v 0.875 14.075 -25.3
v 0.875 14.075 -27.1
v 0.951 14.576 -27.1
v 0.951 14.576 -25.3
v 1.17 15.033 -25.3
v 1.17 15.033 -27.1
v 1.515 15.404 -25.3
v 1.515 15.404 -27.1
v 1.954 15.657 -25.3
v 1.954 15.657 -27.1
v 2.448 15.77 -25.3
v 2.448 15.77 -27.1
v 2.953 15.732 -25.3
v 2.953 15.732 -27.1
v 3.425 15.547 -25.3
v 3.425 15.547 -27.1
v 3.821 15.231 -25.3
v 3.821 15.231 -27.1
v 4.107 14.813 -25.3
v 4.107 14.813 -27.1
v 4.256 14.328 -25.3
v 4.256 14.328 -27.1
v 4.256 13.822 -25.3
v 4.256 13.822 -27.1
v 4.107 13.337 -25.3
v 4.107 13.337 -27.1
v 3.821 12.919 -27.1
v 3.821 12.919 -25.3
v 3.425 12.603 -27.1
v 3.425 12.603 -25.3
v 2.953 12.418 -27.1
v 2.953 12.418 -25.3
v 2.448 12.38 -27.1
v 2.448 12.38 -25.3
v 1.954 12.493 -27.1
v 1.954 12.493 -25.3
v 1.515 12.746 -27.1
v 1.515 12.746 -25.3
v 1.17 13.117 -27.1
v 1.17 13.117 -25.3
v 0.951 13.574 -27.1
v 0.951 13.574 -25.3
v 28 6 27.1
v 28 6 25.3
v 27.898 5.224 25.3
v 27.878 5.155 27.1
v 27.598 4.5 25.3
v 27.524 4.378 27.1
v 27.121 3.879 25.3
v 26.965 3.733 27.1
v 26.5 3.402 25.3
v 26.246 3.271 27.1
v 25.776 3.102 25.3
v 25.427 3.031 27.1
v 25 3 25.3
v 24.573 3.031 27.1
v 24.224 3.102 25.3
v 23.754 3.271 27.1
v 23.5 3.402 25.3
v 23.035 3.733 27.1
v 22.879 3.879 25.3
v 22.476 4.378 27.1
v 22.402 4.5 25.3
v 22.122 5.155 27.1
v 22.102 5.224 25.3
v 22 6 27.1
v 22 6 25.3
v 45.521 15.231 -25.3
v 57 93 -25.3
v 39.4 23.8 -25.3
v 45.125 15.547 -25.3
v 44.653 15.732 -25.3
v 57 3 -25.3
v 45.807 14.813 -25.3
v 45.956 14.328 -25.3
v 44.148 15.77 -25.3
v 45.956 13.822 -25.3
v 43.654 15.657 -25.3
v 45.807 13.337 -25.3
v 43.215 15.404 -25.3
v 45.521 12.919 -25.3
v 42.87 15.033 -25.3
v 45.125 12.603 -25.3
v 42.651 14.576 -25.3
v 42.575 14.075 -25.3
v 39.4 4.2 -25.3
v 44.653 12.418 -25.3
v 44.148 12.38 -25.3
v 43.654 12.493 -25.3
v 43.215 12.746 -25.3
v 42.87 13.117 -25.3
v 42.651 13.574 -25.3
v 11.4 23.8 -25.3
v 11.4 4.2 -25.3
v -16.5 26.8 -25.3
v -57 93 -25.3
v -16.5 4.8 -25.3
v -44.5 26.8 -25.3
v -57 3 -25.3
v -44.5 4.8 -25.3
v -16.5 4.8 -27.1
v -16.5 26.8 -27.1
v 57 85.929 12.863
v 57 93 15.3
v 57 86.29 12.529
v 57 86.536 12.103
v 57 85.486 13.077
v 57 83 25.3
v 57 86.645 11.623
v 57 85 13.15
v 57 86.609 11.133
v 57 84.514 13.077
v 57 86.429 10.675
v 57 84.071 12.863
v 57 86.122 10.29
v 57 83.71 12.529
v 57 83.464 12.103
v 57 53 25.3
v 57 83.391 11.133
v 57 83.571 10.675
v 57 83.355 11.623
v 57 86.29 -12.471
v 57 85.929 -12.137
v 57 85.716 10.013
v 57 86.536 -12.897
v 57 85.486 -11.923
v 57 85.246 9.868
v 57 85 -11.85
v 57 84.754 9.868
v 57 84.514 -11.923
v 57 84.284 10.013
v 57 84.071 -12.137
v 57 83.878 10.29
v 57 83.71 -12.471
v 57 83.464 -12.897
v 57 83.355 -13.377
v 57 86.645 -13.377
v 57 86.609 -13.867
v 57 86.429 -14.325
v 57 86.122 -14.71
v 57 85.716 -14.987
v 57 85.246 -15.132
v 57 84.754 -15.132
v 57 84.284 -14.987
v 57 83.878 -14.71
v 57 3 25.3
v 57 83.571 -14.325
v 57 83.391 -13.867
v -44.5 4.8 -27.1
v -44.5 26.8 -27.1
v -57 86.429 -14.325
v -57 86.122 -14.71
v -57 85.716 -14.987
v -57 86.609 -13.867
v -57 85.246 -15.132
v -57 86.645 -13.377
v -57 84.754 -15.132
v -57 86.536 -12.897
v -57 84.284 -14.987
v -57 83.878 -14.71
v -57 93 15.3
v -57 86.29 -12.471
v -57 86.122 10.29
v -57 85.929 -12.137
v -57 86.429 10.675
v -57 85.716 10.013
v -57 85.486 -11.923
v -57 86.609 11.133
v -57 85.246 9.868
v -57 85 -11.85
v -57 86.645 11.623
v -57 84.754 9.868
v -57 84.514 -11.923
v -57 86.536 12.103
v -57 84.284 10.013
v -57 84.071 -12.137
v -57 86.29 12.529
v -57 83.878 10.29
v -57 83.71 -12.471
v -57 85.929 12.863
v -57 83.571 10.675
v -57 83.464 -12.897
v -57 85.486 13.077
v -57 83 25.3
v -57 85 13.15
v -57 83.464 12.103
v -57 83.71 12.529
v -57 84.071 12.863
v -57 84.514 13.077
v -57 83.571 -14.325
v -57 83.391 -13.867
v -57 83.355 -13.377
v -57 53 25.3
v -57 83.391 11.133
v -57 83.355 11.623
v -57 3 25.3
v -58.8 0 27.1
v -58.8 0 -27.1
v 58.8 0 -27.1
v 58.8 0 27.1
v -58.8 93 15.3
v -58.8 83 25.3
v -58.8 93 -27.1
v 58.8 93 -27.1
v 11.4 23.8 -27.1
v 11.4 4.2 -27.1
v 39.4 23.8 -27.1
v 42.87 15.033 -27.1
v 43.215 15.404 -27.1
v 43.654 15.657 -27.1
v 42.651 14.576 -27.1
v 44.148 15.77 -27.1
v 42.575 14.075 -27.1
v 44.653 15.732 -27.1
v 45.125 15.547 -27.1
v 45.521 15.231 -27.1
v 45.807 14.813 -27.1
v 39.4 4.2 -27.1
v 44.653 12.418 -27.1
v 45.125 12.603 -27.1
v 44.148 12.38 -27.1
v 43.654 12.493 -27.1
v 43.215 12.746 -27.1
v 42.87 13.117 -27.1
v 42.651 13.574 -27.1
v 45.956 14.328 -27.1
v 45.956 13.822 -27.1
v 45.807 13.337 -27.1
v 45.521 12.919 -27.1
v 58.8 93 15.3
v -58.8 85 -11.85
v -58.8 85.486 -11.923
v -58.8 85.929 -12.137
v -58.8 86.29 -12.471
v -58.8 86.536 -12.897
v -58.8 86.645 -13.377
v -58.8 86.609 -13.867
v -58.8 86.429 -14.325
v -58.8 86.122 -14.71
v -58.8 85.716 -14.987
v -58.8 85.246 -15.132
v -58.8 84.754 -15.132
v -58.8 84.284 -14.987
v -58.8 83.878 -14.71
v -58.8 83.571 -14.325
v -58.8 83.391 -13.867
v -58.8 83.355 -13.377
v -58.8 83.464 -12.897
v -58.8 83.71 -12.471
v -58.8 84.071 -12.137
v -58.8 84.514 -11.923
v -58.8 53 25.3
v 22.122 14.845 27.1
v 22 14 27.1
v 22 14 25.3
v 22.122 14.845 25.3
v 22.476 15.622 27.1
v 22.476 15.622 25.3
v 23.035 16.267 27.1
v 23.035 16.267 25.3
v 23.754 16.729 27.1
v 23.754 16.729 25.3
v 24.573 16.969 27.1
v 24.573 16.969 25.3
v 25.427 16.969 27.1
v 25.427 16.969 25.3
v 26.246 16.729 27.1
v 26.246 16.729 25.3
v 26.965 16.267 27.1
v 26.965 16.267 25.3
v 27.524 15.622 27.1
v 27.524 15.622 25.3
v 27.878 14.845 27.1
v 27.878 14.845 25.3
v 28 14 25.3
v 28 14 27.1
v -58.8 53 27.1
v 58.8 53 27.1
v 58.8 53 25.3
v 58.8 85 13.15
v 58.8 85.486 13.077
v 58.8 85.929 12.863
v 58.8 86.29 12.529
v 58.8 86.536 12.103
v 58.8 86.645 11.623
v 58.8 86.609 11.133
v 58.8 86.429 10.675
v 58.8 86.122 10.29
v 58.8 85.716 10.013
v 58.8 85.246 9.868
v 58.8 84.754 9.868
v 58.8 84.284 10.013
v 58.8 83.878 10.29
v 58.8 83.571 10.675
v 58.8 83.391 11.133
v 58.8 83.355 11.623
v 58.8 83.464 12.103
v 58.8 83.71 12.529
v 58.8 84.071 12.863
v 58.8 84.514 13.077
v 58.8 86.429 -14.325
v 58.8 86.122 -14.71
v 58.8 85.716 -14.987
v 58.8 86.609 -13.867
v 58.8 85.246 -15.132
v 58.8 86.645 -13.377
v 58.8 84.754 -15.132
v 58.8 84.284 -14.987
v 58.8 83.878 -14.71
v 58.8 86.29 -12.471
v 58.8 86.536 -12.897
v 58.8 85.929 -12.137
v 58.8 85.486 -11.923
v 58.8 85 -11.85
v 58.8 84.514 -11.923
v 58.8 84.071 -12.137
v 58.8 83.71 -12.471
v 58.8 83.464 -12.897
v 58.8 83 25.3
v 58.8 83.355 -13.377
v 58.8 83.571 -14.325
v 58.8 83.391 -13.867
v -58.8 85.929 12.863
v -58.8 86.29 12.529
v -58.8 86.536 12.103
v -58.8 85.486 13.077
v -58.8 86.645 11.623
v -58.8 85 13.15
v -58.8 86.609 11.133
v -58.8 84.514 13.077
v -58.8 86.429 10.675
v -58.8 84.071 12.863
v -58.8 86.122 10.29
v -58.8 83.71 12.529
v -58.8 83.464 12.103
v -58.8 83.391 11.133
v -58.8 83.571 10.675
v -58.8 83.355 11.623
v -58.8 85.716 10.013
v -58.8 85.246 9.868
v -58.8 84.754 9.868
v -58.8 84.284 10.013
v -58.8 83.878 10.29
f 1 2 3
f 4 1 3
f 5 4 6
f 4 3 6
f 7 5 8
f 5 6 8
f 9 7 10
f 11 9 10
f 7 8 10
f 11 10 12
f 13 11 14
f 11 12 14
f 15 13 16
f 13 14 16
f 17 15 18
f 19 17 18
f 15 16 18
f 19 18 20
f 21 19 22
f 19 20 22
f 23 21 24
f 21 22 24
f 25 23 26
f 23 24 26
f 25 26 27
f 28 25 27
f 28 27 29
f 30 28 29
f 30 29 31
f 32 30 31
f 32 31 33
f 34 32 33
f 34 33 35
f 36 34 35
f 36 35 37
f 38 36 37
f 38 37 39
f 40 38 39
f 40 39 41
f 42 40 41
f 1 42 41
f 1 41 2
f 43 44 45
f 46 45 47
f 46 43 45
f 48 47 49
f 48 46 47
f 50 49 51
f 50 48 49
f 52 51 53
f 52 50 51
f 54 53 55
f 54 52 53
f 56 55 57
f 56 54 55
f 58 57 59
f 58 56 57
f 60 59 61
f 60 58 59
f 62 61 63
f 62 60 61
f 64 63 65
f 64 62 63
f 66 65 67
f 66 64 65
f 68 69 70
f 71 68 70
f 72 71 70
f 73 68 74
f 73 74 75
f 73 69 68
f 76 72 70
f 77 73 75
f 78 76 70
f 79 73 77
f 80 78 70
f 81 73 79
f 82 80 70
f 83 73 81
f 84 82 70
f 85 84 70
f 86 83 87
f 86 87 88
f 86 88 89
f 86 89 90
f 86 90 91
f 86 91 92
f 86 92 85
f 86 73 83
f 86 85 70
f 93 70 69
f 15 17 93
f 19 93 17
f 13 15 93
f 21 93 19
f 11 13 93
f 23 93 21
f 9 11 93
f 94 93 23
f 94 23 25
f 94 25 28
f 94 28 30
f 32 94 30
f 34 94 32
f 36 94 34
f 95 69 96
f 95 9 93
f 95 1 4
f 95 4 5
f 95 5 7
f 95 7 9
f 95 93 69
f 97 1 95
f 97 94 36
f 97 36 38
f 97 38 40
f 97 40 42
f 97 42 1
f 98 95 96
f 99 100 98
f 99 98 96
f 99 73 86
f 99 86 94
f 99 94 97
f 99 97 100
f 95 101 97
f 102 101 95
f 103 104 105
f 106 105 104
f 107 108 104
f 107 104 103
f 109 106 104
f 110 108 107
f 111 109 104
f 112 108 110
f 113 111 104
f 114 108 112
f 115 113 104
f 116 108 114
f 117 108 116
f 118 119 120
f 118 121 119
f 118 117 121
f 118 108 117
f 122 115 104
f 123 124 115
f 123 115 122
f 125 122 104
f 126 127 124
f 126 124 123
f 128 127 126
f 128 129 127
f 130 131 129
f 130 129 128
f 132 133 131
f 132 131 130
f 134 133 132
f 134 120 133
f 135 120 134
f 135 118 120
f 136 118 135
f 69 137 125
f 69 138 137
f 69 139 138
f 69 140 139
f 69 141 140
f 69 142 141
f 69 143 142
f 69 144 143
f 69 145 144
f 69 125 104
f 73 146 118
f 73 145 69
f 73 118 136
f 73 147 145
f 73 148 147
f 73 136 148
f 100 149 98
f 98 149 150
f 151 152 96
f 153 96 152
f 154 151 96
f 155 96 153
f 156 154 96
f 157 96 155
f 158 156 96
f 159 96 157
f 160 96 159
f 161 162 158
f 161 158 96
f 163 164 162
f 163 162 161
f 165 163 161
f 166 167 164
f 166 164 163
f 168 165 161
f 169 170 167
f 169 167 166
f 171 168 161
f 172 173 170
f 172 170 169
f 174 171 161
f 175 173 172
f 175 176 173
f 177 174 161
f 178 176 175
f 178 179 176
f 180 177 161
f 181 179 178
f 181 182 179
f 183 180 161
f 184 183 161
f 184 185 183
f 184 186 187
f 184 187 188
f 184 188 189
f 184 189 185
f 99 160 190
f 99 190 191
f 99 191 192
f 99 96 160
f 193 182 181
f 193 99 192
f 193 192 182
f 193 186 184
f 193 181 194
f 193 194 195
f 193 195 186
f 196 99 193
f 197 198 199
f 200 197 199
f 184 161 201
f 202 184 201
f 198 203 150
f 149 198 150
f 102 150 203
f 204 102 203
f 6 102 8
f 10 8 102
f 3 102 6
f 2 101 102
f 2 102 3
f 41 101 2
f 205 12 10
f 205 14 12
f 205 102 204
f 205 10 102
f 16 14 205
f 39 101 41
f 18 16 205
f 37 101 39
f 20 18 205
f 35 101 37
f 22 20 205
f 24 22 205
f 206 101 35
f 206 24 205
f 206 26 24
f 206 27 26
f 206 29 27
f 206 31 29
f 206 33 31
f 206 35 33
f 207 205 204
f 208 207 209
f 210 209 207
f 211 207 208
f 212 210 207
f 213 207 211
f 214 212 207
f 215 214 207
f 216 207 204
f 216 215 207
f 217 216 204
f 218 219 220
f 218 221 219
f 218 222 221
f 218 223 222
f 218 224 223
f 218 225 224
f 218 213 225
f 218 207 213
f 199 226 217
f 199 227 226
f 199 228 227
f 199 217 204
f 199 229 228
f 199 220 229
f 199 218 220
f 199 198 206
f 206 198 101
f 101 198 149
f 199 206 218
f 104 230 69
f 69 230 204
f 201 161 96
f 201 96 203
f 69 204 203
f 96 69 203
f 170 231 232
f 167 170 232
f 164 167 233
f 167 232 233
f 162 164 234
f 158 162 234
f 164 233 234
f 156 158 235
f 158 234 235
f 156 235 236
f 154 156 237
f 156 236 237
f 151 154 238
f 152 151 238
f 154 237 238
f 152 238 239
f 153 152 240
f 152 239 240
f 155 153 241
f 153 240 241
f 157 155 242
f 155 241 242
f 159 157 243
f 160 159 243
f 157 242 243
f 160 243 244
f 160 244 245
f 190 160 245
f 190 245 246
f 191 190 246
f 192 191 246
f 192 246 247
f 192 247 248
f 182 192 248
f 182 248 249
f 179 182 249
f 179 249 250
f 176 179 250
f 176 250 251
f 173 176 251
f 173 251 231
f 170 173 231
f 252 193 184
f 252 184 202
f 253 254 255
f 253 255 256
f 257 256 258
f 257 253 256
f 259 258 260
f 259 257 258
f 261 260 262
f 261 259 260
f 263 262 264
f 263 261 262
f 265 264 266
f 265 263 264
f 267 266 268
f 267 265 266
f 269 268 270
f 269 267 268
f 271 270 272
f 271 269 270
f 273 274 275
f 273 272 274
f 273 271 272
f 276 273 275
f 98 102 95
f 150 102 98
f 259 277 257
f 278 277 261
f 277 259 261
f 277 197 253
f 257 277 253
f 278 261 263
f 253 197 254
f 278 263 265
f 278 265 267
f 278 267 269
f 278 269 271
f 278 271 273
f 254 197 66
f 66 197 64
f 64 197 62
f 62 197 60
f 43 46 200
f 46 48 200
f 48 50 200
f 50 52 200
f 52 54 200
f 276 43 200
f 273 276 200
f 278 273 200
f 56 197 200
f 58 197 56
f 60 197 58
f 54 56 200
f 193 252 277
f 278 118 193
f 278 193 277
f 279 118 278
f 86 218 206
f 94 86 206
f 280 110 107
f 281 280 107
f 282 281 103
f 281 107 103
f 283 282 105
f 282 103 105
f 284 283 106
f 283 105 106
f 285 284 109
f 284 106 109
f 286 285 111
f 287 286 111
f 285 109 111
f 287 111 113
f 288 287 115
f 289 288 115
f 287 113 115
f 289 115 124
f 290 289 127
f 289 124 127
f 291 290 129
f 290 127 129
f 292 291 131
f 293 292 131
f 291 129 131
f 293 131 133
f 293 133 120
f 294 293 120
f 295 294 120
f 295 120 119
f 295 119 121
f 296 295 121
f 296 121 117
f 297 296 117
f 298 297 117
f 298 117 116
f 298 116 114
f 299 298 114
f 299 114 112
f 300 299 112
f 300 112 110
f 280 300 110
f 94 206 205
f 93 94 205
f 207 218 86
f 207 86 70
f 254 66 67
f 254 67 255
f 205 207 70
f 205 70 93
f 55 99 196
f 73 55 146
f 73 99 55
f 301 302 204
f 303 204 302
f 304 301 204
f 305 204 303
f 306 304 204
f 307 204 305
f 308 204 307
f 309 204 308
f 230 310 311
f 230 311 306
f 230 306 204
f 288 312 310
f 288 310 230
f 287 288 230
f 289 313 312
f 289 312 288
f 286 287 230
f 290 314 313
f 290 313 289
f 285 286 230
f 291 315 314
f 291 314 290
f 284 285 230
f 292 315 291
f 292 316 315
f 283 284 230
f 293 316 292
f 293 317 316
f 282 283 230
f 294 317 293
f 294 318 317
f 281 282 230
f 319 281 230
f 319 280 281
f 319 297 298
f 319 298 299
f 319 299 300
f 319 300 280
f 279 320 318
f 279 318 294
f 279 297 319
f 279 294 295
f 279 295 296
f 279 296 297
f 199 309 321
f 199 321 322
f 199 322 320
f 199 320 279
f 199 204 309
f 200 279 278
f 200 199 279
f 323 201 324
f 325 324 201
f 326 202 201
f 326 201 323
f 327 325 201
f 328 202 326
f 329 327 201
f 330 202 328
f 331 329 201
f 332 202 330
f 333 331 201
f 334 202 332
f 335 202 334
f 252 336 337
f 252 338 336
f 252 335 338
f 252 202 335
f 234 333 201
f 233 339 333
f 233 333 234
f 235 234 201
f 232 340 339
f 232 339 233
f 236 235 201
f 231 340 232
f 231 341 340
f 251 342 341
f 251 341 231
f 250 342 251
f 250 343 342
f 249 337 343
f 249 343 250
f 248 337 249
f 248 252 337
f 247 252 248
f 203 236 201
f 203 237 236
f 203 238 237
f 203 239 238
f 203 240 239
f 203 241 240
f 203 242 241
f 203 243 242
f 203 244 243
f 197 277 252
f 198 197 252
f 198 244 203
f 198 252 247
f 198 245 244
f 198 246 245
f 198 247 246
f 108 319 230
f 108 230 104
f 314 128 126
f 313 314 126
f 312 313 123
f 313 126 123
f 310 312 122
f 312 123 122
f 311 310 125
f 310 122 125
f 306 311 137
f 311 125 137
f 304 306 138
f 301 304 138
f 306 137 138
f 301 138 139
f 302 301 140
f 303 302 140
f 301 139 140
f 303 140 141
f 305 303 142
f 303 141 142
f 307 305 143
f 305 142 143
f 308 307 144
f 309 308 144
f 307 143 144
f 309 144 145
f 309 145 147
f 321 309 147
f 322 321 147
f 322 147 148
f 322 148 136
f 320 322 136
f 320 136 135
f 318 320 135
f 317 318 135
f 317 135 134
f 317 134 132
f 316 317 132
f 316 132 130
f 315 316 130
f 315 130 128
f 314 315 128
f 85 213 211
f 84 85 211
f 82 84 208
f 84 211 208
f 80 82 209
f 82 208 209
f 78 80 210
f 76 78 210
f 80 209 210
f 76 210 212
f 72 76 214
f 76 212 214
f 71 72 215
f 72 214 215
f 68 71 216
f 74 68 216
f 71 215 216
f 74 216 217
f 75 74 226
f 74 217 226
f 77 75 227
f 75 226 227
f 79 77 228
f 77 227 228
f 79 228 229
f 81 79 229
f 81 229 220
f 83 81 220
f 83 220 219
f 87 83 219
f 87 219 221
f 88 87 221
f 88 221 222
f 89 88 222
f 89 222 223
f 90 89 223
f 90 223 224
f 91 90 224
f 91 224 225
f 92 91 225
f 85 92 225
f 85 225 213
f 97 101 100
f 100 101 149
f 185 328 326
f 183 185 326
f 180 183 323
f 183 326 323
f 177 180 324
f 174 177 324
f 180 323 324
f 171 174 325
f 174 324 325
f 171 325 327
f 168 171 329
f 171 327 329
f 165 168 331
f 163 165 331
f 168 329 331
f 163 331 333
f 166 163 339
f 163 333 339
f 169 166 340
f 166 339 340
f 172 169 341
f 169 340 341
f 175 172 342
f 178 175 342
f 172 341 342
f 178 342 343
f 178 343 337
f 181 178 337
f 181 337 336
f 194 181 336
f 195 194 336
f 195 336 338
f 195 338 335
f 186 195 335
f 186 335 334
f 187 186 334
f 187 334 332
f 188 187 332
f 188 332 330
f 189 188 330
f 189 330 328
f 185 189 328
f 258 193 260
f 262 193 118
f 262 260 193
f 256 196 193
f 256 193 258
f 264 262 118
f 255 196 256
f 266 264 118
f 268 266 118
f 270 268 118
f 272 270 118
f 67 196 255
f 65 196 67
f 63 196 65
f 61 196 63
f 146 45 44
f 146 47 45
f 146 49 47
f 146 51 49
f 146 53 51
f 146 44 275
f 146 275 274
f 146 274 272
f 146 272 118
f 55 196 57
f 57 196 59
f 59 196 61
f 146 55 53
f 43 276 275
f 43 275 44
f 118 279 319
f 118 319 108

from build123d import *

# Parameters (mm, degrees)
SKETCH2_W           = 117.6
SKETCH2_H           = 54.2
BOSS_EXTRUDE1_DEPTH = 3
SKETCH3_W           = 117.6
SKETCH3_H           = 54.2
SKETCH3_W_2         = 114
SKETCH3_H_2         = 50.6
BOSS_EXTRUDE2_DEPTH = 50
BOSS_EXTRUDE3_DEPTH = 40
CHAMFER1_SIZE       = 10
SKETCH5_R           = 1.65
CUT_EXTRUDE1_DEPTH  = 153.358688627
CUT_EXTRUDE2_REACH  = 124.654
SKETCH6_R           = 1.7
SKETCH6_W           = 28
SKETCH6_H           = 19.6
SKETCH6_H_2         = 22
CUT_EXTRUDE3_REACH  = 124.654


with BuildPart() as part:
    # Sketch2 → Boss-Extrude1 (new body)
    with BuildSketch(Plane(origin=(0, 0, 0), x_dir=(1, 0, 0), z_dir=(0, 1, 0))):
        Rectangle(SKETCH2_W, SKETCH2_H)
    extrude(amount=BOSS_EXTRUDE1_DEPTH)

    # Sketch3 → Boss-Extrude2 (add)
    with BuildSketch(Plane(origin=(0, 3, 0), x_dir=(1, 0, 0), z_dir=(0, 1, 0))):
        Rectangle(SKETCH3_W, SKETCH3_H)
        Rectangle(SKETCH3_W_2, SKETCH3_H_2, mode=Mode.SUBTRACT)
    extrude(amount=BOSS_EXTRUDE2_DEPTH)

    # Sketch4 → Boss-Extrude3 (add)
    with BuildSketch(Plane(origin=(0, 53, 0), x_dir=(1, 0, 0), z_dir=(0, 1, 0))):
        Polygon((57, -25.3), (57, 25.3), (-57, 25.3), (-57, -25.3), (-58.8, -25.3), (-58.8, 27.1), (58.8, 27.1), (58.8, -25.3), align=None)
    extrude(amount=BOSS_EXTRUDE3_DEPTH)

    # Chamfer1
    chamfer1_edges = [part.edges().sort_by_distance(p)[0] for p in [
        (-57.9, 93, 25.3),
        (57.9, 93, 25.3),
    ]]
    chamfer(chamfer1_edges, length=CHAMFER1_SIZE)

    # Sketch5 → Cut-Extrude1 (cut, through all)
    with BuildSketch(Plane.ZY.offset(58.8)):
        with Locations((11.5, 85)):
            Circle(SKETCH5_R)
        with Locations((-13.5, 85)):
            Circle(SKETCH5_R)
    extrude(amount=-CUT_EXTRUDE1_DEPTH, mode=Mode.SUBTRACT)

    # Sketch6 → Cut-Extrude2 (cut, up to next)
    with BuildSketch(Plane(origin=(0, 0, -27.1), x_dir=(-1, 0, 0), z_dir=(0, 0, -1)), mode=Mode.PRIVATE) as cut_extrude2_sk1:
        with Locations((-2.575, 14.075)):
            Circle(SKETCH6_R)
    cut_extrude2_tool1 = extrude(cut_extrude2_sk1.sketch, amount=-CUT_EXTRUDE2_REACH, mode=Mode.PRIVATE) & part.part
    # Sketch6 → Cut-Extrude2 (cut, up to next)
    with BuildSketch(Plane(origin=(0, 0, -27.1), x_dir=(-1, 0, 0), z_dir=(0, 0, -1)), mode=Mode.PRIVATE) as cut_extrude2_sk2:
        with Locations((-44.275, 14.075)):
            Circle(SKETCH6_R)
    cut_extrude2_tool2 = extrude(cut_extrude2_sk2.sketch, amount=-CUT_EXTRUDE2_REACH, mode=Mode.PRIVATE) & part.part
    # Sketch6 → Cut-Extrude2 (cut, up to next)
    with BuildSketch(Plane(origin=(0, 0, -27.1), x_dir=(-1, 0, 0), z_dir=(0, 0, -1)), mode=Mode.PRIVATE) as cut_extrude2_sk3:
        with Locations((-25.4, 14)):
            Rectangle(SKETCH6_W, SKETCH6_H)
    cut_extrude2_tool3 = extrude(cut_extrude2_sk3.sketch, amount=-CUT_EXTRUDE2_REACH, mode=Mode.PRIVATE) & part.part
    # Sketch6 → Cut-Extrude2 (cut, up to next)
    with BuildSketch(Plane(origin=(0, 0, -27.1), x_dir=(-1, 0, 0), z_dir=(0, 0, -1)), mode=Mode.PRIVATE) as cut_extrude2_sk4:
        with Locations((30.5, 15.8)):
            Rectangle(SKETCH6_W, SKETCH6_H_2)
    cut_extrude2_tool4 = extrude(cut_extrude2_sk4.sketch, amount=-CUT_EXTRUDE2_REACH, mode=Mode.PRIVATE) & part.part
    add(cut_extrude2_tool1.solids().sort_by_distance((2.575, 14.075, -27.1))[0], mode=Mode.SUBTRACT)
    add(cut_extrude2_tool2.solids().sort_by_distance((44.275, 14.075, -27.1))[0], mode=Mode.SUBTRACT)
    add(cut_extrude2_tool3.solids().sort_by_distance((25.4, 14, -27.1))[0], mode=Mode.SUBTRACT)
    add(cut_extrude2_tool4.solids().sort_by_distance((-30.5, 15.8, -27.1))[0], mode=Mode.SUBTRACT)

    # Sketch7 → Cut-Extrude3 (cut, up to next)
    with BuildSketch(Plane.XY.offset(27.1), mode=Mode.PRIVATE) as cut_extrude3_sk1:
        with BuildLine():
            Line((22, 6), (22, 14))
            ThreePointArc((22, 14), (25, 17), (28, 14))
            Line((28, 14), (28, 6))
            ThreePointArc((28, 6), (25, 3), (22, 6))
        make_face()
    cut_extrude3_tool1 = extrude(cut_extrude3_sk1.sketch, amount=-CUT_EXTRUDE3_REACH, mode=Mode.PRIVATE) & part.part
    add(cut_extrude3_tool1.solids().sort_by_distance((25, 10, 27.1))[0], mode=Mode.SUBTRACT)


solid = part.part
